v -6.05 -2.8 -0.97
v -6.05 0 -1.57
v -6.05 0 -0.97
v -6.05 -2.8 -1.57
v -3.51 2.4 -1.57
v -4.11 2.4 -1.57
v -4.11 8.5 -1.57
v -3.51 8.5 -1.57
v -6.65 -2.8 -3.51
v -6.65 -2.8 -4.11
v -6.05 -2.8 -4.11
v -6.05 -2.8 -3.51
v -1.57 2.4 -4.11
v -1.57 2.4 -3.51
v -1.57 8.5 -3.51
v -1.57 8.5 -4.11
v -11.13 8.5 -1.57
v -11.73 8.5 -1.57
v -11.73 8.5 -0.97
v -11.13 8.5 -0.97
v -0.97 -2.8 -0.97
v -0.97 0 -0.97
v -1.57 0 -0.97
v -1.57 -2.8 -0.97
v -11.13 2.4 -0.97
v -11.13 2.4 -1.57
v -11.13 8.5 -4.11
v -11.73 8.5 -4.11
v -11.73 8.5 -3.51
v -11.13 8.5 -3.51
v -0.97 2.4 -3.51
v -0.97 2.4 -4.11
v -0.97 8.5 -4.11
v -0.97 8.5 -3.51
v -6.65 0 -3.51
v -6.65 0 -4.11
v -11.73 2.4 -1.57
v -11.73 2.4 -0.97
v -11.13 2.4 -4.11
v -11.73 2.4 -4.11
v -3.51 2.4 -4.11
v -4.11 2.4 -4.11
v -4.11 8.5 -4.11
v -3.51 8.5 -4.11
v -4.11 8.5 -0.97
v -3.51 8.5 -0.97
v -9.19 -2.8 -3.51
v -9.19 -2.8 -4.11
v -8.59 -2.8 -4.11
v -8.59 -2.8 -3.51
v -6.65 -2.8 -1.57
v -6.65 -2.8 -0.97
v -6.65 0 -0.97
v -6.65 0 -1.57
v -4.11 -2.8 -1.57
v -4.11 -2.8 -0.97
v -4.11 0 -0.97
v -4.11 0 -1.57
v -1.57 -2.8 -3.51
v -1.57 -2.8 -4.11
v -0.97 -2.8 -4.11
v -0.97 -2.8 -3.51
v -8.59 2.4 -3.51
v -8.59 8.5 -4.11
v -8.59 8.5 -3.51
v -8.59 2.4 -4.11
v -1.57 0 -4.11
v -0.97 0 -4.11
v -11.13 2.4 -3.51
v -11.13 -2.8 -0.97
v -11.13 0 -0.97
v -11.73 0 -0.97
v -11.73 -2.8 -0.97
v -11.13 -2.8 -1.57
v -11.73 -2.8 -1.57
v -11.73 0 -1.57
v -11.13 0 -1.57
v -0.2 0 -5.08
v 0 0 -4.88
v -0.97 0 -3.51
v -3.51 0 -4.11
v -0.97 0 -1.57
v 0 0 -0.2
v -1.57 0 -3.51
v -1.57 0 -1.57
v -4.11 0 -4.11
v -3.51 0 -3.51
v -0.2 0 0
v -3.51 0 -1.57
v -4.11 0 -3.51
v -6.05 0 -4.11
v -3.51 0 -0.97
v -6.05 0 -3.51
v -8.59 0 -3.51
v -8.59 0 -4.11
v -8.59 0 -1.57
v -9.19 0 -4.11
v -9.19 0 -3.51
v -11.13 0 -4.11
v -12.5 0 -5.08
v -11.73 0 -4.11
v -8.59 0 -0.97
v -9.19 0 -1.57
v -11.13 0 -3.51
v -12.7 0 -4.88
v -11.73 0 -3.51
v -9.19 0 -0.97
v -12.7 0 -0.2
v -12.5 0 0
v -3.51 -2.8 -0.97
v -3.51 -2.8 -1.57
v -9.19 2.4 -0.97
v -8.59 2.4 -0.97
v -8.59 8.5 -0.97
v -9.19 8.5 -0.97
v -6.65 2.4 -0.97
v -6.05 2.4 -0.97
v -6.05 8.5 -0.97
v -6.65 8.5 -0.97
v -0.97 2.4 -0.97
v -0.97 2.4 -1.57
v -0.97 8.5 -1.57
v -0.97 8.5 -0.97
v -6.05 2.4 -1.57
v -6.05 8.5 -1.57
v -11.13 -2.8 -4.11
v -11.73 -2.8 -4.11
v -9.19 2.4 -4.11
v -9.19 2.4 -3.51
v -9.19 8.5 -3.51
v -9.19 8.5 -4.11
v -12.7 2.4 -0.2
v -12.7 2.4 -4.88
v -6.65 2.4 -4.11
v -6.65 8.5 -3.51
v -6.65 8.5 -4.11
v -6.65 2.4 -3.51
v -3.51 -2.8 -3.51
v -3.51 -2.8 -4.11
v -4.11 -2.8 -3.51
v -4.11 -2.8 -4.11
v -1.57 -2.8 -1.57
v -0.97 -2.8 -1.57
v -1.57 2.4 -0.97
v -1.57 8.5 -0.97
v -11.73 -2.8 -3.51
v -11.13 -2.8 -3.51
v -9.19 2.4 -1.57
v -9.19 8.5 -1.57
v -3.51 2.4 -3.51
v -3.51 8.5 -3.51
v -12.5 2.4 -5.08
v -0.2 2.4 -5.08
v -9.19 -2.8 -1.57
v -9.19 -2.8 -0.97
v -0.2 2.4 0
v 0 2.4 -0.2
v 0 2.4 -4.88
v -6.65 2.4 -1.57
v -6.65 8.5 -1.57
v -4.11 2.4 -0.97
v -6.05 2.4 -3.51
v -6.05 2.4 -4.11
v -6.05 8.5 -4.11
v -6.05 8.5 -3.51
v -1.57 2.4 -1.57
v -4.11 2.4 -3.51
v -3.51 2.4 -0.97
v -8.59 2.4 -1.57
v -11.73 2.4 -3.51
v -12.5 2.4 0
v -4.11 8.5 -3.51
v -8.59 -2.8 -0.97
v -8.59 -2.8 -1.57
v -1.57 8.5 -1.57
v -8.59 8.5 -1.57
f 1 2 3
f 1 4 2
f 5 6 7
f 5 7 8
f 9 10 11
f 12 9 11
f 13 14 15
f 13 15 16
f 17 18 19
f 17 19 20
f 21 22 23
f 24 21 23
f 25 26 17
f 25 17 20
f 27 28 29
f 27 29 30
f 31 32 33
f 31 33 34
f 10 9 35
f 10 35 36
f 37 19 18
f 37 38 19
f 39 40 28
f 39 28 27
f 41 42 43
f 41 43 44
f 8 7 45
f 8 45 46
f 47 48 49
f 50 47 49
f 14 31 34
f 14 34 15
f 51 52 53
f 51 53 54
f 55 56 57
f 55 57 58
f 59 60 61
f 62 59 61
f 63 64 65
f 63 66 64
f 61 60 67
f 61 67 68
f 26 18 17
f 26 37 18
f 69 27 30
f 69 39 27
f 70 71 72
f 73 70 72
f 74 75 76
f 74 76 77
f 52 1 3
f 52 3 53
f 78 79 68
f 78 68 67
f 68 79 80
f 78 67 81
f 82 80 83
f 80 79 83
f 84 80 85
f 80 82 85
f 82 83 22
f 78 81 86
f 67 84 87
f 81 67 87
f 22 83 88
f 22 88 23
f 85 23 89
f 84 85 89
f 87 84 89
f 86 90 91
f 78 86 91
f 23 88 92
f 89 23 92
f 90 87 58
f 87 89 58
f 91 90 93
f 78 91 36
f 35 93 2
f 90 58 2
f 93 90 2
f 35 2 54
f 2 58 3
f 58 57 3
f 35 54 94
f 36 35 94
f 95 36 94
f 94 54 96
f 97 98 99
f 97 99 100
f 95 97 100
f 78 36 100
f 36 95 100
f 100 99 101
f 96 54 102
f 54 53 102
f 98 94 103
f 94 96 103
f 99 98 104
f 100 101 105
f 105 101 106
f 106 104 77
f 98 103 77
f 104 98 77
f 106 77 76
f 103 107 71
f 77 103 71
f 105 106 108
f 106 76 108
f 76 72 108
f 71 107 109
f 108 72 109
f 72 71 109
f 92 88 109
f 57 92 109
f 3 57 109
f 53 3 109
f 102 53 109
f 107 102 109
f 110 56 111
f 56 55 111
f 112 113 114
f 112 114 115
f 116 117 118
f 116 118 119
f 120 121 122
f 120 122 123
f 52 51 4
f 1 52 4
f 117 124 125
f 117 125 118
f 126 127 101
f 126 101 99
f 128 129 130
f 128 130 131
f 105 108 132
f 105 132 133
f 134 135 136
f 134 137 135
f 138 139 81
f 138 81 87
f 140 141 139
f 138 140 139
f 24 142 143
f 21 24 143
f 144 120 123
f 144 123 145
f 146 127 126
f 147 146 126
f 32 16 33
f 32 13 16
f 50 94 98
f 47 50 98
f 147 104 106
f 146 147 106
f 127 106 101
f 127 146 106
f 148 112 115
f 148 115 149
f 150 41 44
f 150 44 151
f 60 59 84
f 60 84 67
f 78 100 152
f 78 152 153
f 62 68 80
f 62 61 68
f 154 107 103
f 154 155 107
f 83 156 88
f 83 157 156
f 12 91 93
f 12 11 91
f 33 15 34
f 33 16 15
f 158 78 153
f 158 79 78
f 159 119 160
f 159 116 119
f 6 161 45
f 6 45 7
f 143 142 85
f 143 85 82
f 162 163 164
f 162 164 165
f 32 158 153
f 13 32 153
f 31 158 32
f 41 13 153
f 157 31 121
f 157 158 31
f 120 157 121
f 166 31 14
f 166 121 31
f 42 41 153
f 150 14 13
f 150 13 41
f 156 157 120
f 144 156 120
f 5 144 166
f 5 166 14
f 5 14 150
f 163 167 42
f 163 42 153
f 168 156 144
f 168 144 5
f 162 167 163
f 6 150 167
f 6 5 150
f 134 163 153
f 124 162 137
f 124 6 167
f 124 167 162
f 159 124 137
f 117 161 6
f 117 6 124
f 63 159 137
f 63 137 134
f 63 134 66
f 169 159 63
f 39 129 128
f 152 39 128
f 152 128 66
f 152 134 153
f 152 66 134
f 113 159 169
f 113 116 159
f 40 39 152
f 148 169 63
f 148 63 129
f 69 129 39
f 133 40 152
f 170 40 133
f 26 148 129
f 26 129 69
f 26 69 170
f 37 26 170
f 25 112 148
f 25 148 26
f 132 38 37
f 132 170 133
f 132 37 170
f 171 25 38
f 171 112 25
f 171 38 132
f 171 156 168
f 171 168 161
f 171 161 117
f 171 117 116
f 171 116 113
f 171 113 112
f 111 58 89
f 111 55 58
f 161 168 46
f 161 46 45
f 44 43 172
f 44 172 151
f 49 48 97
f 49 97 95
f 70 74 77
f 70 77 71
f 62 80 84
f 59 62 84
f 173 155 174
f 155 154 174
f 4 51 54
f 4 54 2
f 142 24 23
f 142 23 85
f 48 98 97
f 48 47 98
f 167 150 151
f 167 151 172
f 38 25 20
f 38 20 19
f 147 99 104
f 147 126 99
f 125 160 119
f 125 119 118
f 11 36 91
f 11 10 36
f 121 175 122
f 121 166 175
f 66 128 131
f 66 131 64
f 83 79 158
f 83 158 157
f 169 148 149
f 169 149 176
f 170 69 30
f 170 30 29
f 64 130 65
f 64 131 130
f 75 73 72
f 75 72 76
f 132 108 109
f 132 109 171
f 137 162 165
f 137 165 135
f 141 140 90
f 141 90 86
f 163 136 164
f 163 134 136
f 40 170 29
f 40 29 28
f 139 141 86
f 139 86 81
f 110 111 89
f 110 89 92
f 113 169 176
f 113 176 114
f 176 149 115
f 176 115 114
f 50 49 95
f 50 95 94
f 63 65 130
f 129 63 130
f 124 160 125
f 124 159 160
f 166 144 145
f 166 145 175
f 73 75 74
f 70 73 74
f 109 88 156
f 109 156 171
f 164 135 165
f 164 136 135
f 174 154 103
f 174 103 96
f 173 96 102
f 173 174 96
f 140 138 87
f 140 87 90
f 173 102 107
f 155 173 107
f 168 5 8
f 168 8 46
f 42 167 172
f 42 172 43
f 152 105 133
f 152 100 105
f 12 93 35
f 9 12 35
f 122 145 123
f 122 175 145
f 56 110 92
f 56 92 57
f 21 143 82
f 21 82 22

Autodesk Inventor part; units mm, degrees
ref_plane "YZ Plane" through (0, 0, 0) normal (1, 0, 0) x (0, 1, 0)
ref_plane "XZ Plane" through (0, 0, 0) normal (0, 1, 0) x (-1, 0, 0)
ref_plane "XY Plane" through (0, 0, 0) normal (0, 0, 1) x (1, 0, 0)
sketch "Sketch1" plane through (0, 0, 0) normal (0, 1, 0) x (-1, 0, 0)
  line L0 (0, 0) -> (12.7, 0)
  line L1 (12.7, 0) -> (12.7, -5.08)
  line L2 (12.7, -5.08) -> (0, -5.08)
  line L3 (0, -5.08) -> (0, 0)
  dimension "d0" = 12.7
  dimension "d1" = 5.08
extrude "Extrusion1" add sketch "Sketch1" along normal blind 2.4
chamfer "Chamfer1" distance 0.2 angle 45 4 edges at (-12.7, 1.2, -5.08) (-12.7, 1.2, 0) (0, 1.2, 0) (0, 1.2, -5.08)
sketch "Sketch2" plane through (0, 2.4, 0) normal (0, 1, 0) x (1, 0, 0)
  line L0 (-11.13, 0.97) -> (-11.73, 0.97)
  line L1 (-11.73, 0.97) -> (-11.73, 1.57)
  line L2 (-11.73, 1.57) -> (-11.13, 1.57)
  line L3 (-11.13, 1.57) -> (-11.13, 0.97)
  line L4 (-11.13, 0.97) -> (-11.73, 1.57) construction
  line L5 (-11.73, 0.97) -> (-11.13, 1.57) construction
  line L6 (-11.13, 3.51) -> (-11.73, 3.51)
  line L7 (-11.73, 3.51) -> (-11.73, 4.11)
  line L8 (-11.73, 4.11) -> (-11.13, 4.11)
  line L9 (-11.13, 4.11) -> (-11.13, 3.51)
  line L10 (-11.13, 3.51) -> (-11.73, 4.11) construction
  line L11 (-11.73, 3.51) -> (-11.13, 4.11) construction
  line L12 (-8.59, 0.97) -> (-9.19, 0.97)
  line L13 (-9.19, 0.97) -> (-9.19, 1.57)
  line L14 (-9.19, 1.57) -> (-8.59, 1.57)
  line L15 (-8.59, 1.57) -> (-8.59, 0.97)
  line L16 (-8.59, 0.97) -> (-9.19, 1.57) construction
  line L17 (-9.19, 0.97) -> (-8.59, 1.57) construction
  line L18 (-8.59, 3.51) -> (-9.19, 3.51)
  line L19 (-9.19, 3.51) -> (-9.19, 4.11)
  line L20 (-9.19, 4.11) -> (-8.59, 4.11)
  line L21 (-8.59, 4.11) -> (-8.59, 3.51)
  line L22 (-8.59, 3.51) -> (-9.19, 4.11) construction
  line L23 (-9.19, 3.51) -> (-8.59, 4.11) construction
  line L24 (-6.05, 0.97) -> (-6.65, 0.97)
  line L25 (-6.65, 0.97) -> (-6.65, 1.57)
  line L26 (-6.65, 1.57) -> (-6.05, 1.57)
  line L27 (-6.05, 1.57) -> (-6.05, 0.97)
  line L28 (-6.05, 0.97) -> (-6.65, 1.57) construction
  line L29 (-6.65, 0.97) -> (-6.05, 1.57) construction
  line L30 (-6.05, 3.51) -> (-6.65, 3.51)
  line L31 (-6.65, 3.51) -> (-6.65, 4.11)
  line L32 (-6.65, 4.11) -> (-6.05, 4.11)
  line L33 (-6.05, 4.11) -> (-6.05, 3.51)
  line L34 (-6.05, 3.51) -> (-6.65, 4.11) construction
  line L35 (-6.65, 3.51) -> (-6.05, 4.11) construction
  line L36 (-3.51, 0.97) -> (-4.11, 0.97)
  line L37 (-4.11, 0.97) -> (-4.11, 1.57)
  line L38 (-4.11, 1.57) -> (-3.51, 1.57)
  line L39 (-3.51, 1.57) -> (-3.51, 0.97)
  line L40 (-3.51, 0.97) -> (-4.11, 1.57) construction
  line L41 (-4.11, 0.97) -> (-3.51, 1.57) construction
  line L42 (-3.51, 3.51) -> (-4.11, 3.51)
  line L43 (-4.11, 3.51) -> (-4.11, 4.11)
  line L44 (-4.11, 4.11) -> (-3.51, 4.11)
  line L45 (-3.51, 4.11) -> (-3.51, 3.51)
  line L46 (-3.51, 3.51) -> (-4.11, 4.11) construction
  line L47 (-4.11, 3.51) -> (-3.51, 4.11) construction
  line L48 (-0.97, 0.97) -> (-1.57, 0.97)
  line L49 (-1.57, 0.97) -> (-1.57, 1.57)
  line L50 (-1.57, 1.57) -> (-0.97, 1.57)
  line L51 (-0.97, 1.57) -> (-0.97, 0.97)
  line L52 (-0.97, 0.97) -> (-1.57, 1.57) construction
  line L53 (-1.57, 0.97) -> (-0.97, 1.57) construction
  line L54 (-0.97, 3.51) -> (-1.57, 3.51)
  line L55 (-1.57, 3.51) -> (-1.57, 4.11)
  line L56 (-1.57, 4.11) -> (-0.97, 4.11)
  line L57 (-0.97, 4.11) -> (-0.97, 3.51)
  line L58 (-0.97, 3.51) -> (-1.57, 4.11) construction
  line L59 (-1.57, 3.51) -> (-0.97, 4.11) construction
  line L60 (-12.7, 4.88) -> (-12.7, 0.2) projected
  line L61 (-12.5, 0) -> (-0.2, 0) projected
  point P0 (0, 0)
  point P1 (-11.43, 1.27)
  point P2 (-11.43, 3.81)
  point P3 (-8.89, 1.27)
  point P4 (-8.89, 3.81)
  point P5 (-6.35, 1.27)
  point P6 (-6.35, 3.81)
  point P7 (-3.81, 1.27)
  point P8 (-3.81, 3.81)
  point P9 (-1.27, 1.27)
  point P10 (-1.27, 3.81)
  dimension "d7" = 0.6
  dimension "d8" = 0.6
  dimension "d11" = 2.54
  dimension "d14" = 2.54
  dimension "d17" = 1.27
  dimension "d18" = 1.27
extrude "Extrusion2" add sketch "Sketch2" along normal blind 6.1 and the other way blind 5.2
properties part number "2x5_P2.54mm_male_header"
